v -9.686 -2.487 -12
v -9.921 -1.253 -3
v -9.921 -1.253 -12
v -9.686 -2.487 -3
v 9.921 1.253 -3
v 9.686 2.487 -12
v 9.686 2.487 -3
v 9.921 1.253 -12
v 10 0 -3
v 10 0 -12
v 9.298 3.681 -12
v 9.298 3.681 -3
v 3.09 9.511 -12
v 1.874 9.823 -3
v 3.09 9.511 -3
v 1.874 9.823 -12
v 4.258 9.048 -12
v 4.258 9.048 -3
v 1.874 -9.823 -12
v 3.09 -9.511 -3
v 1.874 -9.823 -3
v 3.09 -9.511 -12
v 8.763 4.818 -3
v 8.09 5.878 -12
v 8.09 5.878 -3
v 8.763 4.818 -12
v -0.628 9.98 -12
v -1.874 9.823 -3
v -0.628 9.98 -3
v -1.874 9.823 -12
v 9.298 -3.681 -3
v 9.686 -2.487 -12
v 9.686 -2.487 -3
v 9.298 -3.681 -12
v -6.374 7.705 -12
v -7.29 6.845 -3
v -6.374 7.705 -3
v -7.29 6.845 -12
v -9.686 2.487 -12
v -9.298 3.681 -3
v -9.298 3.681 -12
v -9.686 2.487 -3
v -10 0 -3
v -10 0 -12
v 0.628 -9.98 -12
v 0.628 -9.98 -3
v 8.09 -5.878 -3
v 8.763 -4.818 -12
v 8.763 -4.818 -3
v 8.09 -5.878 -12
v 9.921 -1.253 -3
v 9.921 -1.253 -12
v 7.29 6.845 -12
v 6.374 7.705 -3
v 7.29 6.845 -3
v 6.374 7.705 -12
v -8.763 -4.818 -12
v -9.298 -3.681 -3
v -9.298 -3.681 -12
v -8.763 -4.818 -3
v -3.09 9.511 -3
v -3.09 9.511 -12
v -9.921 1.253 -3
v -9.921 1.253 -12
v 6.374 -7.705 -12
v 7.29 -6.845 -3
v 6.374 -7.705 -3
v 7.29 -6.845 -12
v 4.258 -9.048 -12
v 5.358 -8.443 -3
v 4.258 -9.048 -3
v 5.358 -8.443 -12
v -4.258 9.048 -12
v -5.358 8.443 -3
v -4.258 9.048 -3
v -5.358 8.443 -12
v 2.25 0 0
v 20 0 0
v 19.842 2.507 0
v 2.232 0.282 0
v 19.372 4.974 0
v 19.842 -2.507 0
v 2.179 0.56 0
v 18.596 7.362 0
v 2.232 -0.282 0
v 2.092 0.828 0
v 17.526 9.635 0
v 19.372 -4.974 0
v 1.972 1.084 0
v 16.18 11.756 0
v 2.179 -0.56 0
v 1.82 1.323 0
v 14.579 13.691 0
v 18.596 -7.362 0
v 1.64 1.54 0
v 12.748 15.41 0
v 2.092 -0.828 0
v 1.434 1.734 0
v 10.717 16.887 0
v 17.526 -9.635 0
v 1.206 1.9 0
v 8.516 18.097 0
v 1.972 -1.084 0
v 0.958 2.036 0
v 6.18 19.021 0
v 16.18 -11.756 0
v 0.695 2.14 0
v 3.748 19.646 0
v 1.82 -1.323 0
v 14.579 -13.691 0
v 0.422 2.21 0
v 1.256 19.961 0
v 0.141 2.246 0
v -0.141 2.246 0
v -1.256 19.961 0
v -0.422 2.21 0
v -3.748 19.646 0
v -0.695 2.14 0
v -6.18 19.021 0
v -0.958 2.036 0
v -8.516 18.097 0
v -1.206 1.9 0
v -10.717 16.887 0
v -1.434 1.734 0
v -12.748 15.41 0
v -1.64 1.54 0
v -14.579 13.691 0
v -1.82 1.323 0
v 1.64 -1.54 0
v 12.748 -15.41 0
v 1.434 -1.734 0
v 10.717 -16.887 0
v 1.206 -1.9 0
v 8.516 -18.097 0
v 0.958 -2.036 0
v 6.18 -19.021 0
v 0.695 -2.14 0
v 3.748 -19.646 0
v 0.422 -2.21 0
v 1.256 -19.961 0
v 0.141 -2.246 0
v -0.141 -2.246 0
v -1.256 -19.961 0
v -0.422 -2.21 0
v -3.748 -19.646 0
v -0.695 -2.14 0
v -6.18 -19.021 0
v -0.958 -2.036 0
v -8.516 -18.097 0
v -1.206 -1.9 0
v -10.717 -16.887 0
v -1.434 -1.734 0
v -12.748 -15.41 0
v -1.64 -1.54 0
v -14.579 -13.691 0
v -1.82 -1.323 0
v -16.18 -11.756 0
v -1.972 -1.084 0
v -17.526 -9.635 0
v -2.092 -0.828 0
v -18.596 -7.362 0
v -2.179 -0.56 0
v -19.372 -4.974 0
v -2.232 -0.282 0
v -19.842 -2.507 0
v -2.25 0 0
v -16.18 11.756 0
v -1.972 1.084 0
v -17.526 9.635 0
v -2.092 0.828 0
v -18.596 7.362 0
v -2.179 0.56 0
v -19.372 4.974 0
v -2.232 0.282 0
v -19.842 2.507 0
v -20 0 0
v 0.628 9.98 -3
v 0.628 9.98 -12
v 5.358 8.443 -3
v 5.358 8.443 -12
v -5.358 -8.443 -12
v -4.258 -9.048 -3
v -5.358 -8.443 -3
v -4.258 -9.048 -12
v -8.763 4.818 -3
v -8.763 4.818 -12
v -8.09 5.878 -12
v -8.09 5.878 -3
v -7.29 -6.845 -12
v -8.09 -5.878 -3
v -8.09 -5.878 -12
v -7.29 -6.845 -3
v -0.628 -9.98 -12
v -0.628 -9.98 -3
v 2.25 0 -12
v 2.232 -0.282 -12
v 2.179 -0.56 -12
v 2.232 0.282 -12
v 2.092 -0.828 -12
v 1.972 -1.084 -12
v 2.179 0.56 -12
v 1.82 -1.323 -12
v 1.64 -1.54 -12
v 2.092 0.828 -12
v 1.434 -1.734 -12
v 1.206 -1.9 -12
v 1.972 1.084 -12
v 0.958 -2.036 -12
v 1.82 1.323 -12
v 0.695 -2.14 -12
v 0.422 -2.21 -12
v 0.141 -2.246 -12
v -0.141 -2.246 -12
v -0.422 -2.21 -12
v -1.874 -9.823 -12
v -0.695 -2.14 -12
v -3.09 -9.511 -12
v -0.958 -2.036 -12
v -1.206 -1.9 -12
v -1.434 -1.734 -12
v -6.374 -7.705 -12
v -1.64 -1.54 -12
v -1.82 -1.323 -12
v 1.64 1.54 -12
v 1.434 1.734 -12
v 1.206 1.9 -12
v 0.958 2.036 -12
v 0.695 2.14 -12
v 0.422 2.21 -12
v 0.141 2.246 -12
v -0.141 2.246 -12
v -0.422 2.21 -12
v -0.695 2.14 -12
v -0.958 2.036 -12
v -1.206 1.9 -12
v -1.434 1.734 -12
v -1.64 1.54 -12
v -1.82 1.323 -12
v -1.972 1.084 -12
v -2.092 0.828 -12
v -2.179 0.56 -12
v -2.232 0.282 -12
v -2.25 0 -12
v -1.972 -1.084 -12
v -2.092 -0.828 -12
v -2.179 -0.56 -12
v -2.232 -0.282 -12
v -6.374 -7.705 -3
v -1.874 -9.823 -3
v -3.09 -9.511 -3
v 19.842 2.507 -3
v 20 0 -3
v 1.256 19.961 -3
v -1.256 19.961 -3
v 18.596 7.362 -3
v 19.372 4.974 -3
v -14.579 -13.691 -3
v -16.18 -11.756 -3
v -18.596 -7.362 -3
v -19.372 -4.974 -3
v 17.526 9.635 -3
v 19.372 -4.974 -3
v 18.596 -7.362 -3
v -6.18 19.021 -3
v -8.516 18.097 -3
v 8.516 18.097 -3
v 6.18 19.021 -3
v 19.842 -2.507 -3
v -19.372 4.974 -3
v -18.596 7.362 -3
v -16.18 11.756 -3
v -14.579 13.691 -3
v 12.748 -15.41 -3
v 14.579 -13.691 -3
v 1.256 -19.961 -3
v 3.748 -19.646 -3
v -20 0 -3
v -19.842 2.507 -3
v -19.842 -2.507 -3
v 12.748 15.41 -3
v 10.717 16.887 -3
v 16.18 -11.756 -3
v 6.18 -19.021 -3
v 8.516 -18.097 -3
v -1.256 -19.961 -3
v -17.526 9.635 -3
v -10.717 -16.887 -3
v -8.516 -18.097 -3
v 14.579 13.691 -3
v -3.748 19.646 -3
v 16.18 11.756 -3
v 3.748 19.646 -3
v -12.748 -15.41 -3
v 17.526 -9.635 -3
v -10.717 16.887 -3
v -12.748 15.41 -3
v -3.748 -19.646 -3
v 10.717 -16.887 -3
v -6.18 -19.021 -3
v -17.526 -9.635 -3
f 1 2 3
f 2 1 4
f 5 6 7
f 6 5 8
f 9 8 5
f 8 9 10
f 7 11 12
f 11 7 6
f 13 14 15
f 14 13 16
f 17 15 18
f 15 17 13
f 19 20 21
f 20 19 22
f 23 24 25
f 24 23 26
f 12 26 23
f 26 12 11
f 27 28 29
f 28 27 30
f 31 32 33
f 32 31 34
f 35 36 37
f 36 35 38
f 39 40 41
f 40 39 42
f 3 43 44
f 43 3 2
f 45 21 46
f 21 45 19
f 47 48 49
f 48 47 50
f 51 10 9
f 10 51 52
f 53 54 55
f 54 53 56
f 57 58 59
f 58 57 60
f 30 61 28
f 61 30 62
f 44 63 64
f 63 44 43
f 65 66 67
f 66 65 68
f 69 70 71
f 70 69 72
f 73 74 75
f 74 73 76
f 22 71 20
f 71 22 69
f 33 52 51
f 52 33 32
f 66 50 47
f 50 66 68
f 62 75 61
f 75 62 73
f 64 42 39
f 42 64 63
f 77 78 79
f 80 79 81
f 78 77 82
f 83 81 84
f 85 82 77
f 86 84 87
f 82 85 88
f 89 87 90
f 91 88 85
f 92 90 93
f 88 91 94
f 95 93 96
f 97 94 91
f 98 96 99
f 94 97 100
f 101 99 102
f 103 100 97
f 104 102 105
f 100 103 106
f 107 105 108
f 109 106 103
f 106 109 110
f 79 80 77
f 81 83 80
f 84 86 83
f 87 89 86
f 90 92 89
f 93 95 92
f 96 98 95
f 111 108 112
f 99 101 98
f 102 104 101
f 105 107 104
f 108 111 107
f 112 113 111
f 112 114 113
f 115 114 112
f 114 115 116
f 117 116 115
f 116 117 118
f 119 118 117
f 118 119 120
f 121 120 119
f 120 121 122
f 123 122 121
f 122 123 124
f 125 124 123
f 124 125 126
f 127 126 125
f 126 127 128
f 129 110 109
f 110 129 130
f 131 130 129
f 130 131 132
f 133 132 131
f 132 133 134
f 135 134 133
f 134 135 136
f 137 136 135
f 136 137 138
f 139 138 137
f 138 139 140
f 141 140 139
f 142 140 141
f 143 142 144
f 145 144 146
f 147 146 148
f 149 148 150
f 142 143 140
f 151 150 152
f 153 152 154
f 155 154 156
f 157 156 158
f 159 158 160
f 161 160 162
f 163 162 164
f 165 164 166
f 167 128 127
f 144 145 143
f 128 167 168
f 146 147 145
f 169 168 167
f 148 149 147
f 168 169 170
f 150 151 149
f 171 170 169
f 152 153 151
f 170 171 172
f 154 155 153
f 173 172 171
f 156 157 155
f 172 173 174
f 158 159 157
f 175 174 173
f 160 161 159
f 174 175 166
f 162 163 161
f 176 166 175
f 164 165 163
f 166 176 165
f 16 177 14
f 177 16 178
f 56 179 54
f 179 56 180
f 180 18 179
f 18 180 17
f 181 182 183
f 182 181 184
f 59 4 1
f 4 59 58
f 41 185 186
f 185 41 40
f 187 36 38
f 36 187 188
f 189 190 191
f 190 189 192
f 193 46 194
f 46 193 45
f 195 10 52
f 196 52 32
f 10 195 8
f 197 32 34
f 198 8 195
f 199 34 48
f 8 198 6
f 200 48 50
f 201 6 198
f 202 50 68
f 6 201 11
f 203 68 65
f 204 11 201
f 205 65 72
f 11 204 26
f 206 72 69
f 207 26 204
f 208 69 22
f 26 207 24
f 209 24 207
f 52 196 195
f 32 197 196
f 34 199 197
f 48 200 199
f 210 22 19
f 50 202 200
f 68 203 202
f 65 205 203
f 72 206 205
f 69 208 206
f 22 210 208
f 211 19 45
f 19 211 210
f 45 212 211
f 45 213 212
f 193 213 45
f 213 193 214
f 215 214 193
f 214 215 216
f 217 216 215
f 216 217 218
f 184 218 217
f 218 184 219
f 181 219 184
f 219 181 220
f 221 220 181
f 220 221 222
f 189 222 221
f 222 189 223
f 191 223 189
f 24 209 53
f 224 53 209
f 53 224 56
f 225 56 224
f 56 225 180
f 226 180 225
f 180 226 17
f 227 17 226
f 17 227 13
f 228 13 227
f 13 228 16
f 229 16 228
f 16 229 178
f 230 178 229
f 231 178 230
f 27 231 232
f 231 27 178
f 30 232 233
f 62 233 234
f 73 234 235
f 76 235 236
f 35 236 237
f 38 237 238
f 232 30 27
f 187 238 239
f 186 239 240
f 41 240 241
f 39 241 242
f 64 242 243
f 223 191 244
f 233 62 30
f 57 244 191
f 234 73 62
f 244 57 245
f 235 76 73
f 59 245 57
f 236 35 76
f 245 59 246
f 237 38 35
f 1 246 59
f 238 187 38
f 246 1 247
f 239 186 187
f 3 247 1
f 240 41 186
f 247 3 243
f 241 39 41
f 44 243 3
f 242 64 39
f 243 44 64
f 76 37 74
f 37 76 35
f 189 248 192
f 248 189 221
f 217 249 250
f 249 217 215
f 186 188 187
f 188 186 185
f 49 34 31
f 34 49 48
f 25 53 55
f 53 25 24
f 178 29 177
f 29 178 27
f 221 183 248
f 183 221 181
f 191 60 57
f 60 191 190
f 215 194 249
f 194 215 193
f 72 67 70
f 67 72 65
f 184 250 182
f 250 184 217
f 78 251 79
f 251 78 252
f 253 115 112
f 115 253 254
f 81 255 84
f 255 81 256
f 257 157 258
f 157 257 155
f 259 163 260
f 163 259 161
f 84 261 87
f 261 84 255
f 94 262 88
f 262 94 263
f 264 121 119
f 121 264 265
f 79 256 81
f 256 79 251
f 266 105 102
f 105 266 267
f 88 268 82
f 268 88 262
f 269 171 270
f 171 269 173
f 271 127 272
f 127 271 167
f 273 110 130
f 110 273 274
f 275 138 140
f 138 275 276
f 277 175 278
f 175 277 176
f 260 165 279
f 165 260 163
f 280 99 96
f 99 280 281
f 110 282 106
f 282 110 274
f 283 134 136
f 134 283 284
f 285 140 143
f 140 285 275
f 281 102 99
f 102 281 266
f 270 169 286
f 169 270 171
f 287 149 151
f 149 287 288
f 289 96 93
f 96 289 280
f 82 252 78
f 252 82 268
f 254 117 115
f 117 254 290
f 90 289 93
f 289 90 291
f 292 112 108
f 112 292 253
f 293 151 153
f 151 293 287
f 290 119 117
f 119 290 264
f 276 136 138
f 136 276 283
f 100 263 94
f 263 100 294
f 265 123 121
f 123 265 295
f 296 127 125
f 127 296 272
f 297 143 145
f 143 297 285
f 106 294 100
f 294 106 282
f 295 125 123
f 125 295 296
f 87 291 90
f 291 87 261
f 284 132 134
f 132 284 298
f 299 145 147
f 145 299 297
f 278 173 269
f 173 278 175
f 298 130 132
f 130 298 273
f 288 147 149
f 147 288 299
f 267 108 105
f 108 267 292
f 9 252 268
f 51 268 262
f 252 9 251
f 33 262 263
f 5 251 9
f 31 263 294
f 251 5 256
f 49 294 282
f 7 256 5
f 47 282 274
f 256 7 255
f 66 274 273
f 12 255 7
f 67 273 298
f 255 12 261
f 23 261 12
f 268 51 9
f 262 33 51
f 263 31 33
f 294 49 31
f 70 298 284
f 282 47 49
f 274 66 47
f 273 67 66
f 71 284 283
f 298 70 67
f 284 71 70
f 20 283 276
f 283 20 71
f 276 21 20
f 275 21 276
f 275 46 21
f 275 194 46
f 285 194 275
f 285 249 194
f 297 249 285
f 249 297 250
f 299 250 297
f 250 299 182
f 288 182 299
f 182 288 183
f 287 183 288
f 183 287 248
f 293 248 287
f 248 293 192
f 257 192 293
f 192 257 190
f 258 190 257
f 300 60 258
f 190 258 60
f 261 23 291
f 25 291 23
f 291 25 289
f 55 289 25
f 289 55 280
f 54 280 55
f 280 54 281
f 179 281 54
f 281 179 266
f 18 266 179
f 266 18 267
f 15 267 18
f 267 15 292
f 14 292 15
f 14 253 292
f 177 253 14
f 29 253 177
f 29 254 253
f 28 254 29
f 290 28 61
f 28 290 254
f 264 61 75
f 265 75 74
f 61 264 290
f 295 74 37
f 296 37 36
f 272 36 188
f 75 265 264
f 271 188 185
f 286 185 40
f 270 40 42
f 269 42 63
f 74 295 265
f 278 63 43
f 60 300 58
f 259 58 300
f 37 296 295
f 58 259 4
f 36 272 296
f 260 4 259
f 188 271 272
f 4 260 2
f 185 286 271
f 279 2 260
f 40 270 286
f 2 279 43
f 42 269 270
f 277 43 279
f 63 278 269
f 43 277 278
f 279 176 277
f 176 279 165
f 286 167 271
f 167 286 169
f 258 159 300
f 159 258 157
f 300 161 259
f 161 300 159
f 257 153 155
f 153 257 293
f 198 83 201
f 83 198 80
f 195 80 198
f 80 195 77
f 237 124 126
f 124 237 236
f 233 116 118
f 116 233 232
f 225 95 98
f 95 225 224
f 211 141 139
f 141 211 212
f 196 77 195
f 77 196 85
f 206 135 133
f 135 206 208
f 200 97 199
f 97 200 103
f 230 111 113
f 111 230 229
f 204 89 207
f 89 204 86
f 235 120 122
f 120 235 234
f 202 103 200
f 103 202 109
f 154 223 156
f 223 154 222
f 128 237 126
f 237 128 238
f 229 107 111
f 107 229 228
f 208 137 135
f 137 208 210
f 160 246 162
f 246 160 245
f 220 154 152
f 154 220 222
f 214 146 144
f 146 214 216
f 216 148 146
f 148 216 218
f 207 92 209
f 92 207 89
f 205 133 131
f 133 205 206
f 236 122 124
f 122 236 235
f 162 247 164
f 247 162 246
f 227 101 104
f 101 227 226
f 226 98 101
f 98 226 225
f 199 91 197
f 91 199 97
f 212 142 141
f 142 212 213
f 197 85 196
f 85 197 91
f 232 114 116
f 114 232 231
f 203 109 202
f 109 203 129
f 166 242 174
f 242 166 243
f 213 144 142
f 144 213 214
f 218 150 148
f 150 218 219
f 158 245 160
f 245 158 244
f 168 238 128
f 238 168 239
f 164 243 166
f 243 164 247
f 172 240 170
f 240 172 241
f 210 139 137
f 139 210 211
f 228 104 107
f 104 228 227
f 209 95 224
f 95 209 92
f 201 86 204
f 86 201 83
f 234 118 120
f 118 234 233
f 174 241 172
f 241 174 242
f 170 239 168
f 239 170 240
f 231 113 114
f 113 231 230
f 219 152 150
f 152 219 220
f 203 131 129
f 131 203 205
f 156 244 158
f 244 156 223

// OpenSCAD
$fn = 50;


difference() {
	union() {
		translate(v = [0, 0, -12.0000000000]) {
			cylinder(h = 12, r = 10.0000000000);
		}
		translate(v = [0, 0, -3.0000000000]) {
			cylinder(h = 3, r = 20.0000000000);
		}
	}
	union() {
		#translate(v = [0, 0, -12]) {
			cylinder(h = 12, r = 2.2500000000);
		}
	}
}
